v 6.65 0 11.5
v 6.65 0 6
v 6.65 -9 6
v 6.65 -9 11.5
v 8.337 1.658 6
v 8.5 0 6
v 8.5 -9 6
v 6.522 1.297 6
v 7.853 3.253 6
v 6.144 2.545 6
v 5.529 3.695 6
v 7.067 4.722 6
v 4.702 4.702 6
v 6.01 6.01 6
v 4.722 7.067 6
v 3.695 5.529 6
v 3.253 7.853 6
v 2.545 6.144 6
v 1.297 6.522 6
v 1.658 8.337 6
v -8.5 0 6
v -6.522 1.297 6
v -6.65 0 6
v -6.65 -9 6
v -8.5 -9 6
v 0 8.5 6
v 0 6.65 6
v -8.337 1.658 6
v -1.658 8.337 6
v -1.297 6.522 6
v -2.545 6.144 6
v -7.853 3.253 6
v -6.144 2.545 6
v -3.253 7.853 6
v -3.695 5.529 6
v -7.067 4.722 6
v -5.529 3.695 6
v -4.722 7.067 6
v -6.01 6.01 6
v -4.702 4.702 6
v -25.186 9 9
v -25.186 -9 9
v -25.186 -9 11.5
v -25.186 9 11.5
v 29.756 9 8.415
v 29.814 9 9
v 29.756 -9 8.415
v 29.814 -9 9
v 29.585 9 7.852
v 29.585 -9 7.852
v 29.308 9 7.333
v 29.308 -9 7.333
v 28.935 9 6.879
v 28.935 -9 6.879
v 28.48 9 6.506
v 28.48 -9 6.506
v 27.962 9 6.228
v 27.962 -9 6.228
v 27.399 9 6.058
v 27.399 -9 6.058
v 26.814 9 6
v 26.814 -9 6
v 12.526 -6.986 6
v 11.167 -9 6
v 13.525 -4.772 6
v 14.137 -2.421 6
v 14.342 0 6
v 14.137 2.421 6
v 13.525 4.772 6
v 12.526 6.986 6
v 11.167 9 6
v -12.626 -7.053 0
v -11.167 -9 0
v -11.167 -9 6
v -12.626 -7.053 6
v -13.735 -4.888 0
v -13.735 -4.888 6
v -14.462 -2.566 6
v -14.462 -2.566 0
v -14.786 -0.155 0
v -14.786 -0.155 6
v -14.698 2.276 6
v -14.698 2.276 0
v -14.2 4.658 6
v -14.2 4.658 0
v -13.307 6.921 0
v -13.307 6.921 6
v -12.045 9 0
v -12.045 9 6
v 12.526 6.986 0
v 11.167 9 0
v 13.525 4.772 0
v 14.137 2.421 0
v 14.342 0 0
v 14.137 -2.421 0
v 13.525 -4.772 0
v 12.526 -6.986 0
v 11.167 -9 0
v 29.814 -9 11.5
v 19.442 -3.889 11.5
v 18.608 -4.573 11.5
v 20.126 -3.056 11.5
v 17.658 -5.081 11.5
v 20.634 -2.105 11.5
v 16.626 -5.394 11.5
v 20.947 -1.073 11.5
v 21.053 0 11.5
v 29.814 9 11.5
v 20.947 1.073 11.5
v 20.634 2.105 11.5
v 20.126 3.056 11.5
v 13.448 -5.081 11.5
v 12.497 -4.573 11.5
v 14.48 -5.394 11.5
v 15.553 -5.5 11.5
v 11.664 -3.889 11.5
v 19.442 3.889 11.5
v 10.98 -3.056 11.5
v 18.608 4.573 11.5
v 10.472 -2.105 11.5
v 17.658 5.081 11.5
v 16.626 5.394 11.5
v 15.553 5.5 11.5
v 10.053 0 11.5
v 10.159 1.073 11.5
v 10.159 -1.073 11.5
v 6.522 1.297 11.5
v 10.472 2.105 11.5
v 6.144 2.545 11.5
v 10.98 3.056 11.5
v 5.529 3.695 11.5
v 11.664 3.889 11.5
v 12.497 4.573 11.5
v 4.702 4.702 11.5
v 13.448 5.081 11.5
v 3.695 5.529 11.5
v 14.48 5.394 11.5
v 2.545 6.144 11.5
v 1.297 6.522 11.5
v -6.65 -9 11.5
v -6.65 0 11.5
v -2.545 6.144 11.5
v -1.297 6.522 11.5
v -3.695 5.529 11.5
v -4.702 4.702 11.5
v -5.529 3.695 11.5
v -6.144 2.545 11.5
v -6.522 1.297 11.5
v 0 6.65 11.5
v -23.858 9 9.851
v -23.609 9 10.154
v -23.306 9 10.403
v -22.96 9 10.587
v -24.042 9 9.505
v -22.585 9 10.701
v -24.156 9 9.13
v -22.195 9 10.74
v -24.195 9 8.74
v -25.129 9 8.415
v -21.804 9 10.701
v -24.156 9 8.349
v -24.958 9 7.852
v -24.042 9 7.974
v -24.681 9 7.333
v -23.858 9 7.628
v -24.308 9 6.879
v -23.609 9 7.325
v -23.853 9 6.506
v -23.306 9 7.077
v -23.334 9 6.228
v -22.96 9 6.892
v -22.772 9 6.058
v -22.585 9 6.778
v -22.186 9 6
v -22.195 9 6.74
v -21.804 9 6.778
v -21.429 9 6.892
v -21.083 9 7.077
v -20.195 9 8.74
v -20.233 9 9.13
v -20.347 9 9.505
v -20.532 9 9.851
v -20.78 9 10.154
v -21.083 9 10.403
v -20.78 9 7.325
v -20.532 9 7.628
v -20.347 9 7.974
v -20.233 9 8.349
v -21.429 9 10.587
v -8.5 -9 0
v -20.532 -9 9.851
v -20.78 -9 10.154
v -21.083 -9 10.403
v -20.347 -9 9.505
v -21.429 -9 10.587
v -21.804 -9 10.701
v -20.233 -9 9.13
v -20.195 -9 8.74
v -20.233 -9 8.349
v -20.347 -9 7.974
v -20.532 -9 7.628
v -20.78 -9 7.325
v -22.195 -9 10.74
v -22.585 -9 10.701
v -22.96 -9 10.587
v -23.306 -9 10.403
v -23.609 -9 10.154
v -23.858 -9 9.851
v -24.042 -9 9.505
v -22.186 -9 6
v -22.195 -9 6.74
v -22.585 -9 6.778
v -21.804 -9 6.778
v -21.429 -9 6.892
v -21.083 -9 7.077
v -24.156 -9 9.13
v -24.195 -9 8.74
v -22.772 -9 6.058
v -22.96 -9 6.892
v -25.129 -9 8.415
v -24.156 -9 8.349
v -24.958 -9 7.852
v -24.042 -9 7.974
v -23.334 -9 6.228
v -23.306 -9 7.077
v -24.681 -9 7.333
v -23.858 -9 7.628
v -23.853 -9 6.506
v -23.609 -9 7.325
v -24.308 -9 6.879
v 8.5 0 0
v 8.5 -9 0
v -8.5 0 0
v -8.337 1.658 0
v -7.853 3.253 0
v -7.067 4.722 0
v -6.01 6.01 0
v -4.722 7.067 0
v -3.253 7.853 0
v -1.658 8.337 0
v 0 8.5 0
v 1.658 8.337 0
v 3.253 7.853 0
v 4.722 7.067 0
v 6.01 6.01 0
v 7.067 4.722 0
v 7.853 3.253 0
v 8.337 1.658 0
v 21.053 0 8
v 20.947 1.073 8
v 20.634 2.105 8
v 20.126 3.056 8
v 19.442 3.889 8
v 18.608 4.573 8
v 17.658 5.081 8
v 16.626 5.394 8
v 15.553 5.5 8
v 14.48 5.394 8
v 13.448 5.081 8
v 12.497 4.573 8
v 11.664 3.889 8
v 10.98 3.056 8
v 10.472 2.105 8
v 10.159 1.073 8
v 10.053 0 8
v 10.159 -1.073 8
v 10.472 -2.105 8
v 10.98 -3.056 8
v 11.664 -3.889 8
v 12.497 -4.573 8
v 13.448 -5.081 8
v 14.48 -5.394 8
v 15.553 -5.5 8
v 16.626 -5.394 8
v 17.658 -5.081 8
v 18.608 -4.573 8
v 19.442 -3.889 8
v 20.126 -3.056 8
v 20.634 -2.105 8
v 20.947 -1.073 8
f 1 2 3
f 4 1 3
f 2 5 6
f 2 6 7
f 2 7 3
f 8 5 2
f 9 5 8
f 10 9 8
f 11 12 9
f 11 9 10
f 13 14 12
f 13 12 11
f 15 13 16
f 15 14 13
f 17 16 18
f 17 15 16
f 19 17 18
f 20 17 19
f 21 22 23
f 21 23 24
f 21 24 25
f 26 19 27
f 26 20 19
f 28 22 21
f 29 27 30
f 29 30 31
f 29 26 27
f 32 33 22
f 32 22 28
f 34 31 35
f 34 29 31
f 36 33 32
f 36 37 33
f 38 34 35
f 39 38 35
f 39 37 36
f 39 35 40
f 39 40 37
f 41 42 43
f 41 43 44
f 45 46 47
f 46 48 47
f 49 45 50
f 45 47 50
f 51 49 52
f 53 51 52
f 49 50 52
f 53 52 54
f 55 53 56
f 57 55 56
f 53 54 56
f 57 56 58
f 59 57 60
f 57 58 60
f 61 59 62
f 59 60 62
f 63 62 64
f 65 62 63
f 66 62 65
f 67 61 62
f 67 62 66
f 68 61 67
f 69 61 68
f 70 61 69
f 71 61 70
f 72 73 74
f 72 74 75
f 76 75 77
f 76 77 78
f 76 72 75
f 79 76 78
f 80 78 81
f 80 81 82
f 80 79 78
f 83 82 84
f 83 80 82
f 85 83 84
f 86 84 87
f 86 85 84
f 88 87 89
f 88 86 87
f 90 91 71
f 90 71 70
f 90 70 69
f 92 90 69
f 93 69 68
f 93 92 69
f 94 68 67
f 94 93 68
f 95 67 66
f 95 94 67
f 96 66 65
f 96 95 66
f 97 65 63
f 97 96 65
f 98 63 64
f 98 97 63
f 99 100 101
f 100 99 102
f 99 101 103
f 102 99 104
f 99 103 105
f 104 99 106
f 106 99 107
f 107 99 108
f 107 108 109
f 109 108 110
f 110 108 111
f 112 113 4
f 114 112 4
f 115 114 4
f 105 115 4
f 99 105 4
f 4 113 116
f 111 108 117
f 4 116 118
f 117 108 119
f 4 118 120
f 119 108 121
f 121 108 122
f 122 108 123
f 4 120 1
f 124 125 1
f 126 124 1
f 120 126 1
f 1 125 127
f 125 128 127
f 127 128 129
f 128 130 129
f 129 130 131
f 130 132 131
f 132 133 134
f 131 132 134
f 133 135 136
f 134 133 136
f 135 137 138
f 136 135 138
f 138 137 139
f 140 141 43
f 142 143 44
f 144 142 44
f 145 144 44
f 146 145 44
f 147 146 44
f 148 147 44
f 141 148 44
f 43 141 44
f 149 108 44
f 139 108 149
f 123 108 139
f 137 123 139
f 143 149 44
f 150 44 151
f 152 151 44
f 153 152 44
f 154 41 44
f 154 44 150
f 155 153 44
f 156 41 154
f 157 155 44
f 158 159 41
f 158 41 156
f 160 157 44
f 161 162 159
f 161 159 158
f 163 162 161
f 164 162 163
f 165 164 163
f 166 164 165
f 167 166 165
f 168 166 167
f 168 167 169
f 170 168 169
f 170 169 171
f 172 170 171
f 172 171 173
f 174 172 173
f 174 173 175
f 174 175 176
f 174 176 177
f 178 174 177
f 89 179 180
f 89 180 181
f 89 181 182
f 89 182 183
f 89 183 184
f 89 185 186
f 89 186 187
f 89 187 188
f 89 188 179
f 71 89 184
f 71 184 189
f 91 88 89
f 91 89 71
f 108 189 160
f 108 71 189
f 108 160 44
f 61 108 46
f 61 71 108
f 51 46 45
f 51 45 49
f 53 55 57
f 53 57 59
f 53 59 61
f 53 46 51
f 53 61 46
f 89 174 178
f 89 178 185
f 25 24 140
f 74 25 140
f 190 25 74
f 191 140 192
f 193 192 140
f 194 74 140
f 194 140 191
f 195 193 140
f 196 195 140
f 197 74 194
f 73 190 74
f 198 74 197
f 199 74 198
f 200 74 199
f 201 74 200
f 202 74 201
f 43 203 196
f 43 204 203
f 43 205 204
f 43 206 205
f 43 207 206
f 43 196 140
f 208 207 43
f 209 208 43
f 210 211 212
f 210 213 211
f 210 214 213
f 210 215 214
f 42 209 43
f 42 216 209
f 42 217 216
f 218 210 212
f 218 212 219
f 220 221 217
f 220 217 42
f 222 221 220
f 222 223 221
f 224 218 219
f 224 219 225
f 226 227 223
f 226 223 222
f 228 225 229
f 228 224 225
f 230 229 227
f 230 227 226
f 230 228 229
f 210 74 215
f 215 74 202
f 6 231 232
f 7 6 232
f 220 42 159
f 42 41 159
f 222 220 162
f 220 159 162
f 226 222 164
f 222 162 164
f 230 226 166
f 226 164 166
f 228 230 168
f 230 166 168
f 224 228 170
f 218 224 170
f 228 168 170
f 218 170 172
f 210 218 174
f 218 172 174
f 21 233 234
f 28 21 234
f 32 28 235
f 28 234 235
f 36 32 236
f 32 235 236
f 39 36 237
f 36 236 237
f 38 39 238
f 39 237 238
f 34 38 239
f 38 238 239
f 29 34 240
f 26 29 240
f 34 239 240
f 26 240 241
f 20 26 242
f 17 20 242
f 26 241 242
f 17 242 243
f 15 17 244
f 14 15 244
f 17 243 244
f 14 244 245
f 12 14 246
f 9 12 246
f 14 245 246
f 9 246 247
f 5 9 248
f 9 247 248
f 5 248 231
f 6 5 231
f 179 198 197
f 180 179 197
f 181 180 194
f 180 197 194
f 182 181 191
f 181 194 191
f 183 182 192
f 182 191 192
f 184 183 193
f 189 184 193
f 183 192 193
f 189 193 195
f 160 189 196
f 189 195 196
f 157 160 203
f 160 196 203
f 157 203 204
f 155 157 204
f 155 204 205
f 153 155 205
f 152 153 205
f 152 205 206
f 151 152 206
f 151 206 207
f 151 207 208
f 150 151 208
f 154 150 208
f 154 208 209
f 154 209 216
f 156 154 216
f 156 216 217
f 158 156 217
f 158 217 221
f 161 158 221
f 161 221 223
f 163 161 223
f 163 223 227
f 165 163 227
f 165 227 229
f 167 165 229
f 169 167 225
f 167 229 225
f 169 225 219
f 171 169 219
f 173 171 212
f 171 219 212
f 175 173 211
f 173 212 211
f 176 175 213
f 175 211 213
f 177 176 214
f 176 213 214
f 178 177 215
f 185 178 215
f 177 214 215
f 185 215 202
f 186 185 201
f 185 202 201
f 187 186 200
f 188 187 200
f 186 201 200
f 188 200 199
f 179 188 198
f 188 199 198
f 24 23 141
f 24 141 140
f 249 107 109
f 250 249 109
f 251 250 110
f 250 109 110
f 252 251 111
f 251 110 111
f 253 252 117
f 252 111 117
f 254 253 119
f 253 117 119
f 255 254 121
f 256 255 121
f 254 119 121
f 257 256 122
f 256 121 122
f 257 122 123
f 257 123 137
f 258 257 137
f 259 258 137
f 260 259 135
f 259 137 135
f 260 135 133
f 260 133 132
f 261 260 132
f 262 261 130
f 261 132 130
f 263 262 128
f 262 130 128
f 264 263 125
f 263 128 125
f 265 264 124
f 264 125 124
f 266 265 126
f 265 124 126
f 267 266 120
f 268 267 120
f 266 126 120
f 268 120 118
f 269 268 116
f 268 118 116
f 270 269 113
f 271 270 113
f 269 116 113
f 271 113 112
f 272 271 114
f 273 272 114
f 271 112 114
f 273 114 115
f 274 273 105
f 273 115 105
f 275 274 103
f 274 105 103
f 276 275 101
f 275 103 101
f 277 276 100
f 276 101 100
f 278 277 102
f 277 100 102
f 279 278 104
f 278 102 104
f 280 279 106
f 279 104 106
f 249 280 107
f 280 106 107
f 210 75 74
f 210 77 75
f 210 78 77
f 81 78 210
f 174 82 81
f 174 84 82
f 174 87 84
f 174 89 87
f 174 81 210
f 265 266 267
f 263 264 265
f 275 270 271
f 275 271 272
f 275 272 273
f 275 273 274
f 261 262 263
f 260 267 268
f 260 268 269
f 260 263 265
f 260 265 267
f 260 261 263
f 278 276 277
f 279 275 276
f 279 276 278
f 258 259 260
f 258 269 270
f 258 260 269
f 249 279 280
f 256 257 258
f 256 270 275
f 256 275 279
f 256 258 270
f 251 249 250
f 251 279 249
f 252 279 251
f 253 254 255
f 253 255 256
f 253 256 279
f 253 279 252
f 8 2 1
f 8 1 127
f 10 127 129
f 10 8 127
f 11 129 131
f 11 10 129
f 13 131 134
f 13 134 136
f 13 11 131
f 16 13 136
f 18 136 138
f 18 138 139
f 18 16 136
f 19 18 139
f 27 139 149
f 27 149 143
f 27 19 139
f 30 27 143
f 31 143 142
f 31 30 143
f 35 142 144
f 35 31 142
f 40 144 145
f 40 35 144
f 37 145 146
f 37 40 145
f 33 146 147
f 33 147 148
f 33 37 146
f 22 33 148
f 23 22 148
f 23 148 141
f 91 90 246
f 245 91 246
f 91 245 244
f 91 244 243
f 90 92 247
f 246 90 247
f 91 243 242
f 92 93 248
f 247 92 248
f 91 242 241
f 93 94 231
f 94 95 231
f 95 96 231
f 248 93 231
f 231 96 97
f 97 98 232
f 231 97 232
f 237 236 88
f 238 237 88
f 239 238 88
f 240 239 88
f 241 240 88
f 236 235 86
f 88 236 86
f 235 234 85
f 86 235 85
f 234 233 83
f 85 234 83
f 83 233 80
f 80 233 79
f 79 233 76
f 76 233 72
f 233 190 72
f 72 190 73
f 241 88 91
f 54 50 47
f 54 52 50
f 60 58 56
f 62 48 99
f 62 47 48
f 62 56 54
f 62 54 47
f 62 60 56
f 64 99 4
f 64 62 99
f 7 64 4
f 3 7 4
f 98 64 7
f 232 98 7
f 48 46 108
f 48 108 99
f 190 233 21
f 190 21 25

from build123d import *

# Parameters (mm, degrees)
PAD_DEPTH       = 5.5
SKETCH006_R     = 2
POCKET001_DEPTH = 50
SKETCH004_R     = 5.5
POCKET_DEPTH    = 3.5
PAD001_DEPTH    = 6
FILLET_R        = 3


with BuildPart() as pocket:
    # Sketch → Pad (new body)
    with BuildSketch(Plane.XY.offset(6)):
        with BuildLine():
            ThreePointArc((6.65, 0), (0, 6.65), (-6.65, 0))
            Line((-6.65, 0), (-6.65, -9))
            Line((-6.65, -9), (-25.186368, -9))
            Line((-25.186368, -9), (-25.186368, 9))
            Line((-25.186368, 9), (29.813632, 9))
            Line((29.813632, 9), (29.813632, -9))
            Line((29.813632, -9), (6.65, -9))
            Line((6.65, 0), (6.65, -9))
        make_face()
    extrude(amount=PAD_DEPTH)

    # Sketch006 → Pocket001 (cut)
    with BuildSketch(Plane(origin=(0, -9, 6), x_dir=(1, 0, 0), z_dir=(0, -1, 0))):
        with Locations((-22.194616, 2.739605)):
            Circle(SKETCH006_R)
    extrude(amount=-POCKET001_DEPTH, mode=Mode.SUBTRACT)

    # Sketch004 → Pocket (cut)
    with BuildSketch(Plane.XY.offset(11.5)):
        with Locations((15.55286, 0)):
            Circle(SKETCH004_R)
    extrude(amount=-POCKET_DEPTH, mode=Mode.SUBTRACT)


with BuildPart() as fillet_body:
    # Sketch005 → Pad001 (new body)
    with BuildSketch(Plane(origin=(0, 0, 0), x_dir=(1, 0, 0), z_dir=(0, 0, -1))):
        with BuildLine():
            ThreePointArc((-8.5, 0), (0, -8.5), (8.5, 0))
            Line((8.5, 0), (8.5, 9))
            Line((8.5, 9), (11.167023, 9))
            ThreePointArc((11.167023, -9), (14.342329, 0), (11.167023, 9))
            Line((-12.044614, -9), (11.167023, -9))
            ThreePointArc((-11.167023, 9), (-14.785971, 0.155049), (-12.044614, -9))
            Line((-8.5, 9), (-11.167023, 9))
            Line((-8.5, 0), (-8.5, 9))
        make_face()
    extrude(amount=-PAD001_DEPTH)

    # Fusion: union Pocket
    add(pocket.part)

    # Fillet
    fillet_edges = [fillet_body.edges().sort_by_distance(p)[0] for p in [
        (-25.186368, 0, 6),
        (29.813632, 0, 6),
    ]]
    fillet(fillet_edges, radius=FILLET_R)


solid = fillet_body.part
